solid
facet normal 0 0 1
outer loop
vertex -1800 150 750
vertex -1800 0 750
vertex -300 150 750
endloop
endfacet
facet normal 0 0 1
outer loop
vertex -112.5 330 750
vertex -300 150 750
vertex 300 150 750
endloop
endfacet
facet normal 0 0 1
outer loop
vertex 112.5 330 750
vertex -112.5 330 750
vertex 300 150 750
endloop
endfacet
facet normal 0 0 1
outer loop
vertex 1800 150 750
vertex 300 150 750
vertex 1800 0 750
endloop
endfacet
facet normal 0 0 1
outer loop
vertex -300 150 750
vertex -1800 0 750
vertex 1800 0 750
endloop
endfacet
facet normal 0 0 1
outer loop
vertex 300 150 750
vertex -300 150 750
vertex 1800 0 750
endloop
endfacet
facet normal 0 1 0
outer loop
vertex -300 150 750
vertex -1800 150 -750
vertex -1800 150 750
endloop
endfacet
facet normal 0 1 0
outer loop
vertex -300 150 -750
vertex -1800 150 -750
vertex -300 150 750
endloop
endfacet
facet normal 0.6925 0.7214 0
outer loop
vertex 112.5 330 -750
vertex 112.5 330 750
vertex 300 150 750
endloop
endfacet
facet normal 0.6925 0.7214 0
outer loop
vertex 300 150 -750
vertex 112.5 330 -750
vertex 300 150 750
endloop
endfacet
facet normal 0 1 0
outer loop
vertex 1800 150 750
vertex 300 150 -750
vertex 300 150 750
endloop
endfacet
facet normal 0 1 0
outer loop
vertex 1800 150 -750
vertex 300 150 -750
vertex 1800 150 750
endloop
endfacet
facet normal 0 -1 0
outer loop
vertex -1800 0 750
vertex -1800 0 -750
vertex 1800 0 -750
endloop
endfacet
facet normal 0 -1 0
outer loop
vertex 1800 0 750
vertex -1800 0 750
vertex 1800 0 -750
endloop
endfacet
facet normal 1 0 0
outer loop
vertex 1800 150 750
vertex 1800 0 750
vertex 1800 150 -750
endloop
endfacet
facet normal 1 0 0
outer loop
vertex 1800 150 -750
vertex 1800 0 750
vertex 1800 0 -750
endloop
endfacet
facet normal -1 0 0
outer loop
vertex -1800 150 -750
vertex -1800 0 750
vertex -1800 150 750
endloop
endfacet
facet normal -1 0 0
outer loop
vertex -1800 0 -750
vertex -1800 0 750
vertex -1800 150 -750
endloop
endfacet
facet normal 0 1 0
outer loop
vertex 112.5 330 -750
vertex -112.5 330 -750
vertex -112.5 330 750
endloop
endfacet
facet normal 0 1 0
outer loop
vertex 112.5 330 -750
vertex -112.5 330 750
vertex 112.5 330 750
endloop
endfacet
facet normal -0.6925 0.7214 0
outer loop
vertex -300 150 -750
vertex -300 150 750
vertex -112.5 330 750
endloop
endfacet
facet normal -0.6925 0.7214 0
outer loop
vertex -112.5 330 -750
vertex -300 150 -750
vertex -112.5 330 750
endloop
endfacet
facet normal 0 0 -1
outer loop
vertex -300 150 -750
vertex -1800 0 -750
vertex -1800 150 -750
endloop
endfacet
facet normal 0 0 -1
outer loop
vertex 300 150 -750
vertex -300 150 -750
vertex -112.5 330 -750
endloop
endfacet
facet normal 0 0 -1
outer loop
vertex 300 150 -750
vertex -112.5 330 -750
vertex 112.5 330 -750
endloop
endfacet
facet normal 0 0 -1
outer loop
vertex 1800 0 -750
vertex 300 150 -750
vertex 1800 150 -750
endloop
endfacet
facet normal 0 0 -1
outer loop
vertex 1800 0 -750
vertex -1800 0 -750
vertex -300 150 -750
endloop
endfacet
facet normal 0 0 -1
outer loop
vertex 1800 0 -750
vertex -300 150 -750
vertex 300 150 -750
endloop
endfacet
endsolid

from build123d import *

# Parameters (mm, degrees)
SKETCH1_W           = 3600
SKETCH1_H           = 1500
BOSS_EXTRUDE1_DEPTH = 150
BOSS_EXTRUDE2_DEPTH = 1500


with BuildPart() as part:
    # Sketch1 → Boss-Extrude1 (new body)
    with BuildSketch(Plane(origin=(0, 0, 0), x_dir=(1, 0, 0), z_dir=(0, 1, 0))):
        Rectangle(SKETCH1_W, SKETCH1_H)
    extrude(amount=BOSS_EXTRUDE1_DEPTH)

    # Sketch3 → Boss-Extrude2 (add)
    with BuildSketch(Plane.XY.offset(750)):
        Polygon((300, 150), (-300, 150), (-112.5, 330), (112.5, 330), align=None)
    extrude(amount=-BOSS_EXTRUDE2_DEPTH)


solid = part.part
